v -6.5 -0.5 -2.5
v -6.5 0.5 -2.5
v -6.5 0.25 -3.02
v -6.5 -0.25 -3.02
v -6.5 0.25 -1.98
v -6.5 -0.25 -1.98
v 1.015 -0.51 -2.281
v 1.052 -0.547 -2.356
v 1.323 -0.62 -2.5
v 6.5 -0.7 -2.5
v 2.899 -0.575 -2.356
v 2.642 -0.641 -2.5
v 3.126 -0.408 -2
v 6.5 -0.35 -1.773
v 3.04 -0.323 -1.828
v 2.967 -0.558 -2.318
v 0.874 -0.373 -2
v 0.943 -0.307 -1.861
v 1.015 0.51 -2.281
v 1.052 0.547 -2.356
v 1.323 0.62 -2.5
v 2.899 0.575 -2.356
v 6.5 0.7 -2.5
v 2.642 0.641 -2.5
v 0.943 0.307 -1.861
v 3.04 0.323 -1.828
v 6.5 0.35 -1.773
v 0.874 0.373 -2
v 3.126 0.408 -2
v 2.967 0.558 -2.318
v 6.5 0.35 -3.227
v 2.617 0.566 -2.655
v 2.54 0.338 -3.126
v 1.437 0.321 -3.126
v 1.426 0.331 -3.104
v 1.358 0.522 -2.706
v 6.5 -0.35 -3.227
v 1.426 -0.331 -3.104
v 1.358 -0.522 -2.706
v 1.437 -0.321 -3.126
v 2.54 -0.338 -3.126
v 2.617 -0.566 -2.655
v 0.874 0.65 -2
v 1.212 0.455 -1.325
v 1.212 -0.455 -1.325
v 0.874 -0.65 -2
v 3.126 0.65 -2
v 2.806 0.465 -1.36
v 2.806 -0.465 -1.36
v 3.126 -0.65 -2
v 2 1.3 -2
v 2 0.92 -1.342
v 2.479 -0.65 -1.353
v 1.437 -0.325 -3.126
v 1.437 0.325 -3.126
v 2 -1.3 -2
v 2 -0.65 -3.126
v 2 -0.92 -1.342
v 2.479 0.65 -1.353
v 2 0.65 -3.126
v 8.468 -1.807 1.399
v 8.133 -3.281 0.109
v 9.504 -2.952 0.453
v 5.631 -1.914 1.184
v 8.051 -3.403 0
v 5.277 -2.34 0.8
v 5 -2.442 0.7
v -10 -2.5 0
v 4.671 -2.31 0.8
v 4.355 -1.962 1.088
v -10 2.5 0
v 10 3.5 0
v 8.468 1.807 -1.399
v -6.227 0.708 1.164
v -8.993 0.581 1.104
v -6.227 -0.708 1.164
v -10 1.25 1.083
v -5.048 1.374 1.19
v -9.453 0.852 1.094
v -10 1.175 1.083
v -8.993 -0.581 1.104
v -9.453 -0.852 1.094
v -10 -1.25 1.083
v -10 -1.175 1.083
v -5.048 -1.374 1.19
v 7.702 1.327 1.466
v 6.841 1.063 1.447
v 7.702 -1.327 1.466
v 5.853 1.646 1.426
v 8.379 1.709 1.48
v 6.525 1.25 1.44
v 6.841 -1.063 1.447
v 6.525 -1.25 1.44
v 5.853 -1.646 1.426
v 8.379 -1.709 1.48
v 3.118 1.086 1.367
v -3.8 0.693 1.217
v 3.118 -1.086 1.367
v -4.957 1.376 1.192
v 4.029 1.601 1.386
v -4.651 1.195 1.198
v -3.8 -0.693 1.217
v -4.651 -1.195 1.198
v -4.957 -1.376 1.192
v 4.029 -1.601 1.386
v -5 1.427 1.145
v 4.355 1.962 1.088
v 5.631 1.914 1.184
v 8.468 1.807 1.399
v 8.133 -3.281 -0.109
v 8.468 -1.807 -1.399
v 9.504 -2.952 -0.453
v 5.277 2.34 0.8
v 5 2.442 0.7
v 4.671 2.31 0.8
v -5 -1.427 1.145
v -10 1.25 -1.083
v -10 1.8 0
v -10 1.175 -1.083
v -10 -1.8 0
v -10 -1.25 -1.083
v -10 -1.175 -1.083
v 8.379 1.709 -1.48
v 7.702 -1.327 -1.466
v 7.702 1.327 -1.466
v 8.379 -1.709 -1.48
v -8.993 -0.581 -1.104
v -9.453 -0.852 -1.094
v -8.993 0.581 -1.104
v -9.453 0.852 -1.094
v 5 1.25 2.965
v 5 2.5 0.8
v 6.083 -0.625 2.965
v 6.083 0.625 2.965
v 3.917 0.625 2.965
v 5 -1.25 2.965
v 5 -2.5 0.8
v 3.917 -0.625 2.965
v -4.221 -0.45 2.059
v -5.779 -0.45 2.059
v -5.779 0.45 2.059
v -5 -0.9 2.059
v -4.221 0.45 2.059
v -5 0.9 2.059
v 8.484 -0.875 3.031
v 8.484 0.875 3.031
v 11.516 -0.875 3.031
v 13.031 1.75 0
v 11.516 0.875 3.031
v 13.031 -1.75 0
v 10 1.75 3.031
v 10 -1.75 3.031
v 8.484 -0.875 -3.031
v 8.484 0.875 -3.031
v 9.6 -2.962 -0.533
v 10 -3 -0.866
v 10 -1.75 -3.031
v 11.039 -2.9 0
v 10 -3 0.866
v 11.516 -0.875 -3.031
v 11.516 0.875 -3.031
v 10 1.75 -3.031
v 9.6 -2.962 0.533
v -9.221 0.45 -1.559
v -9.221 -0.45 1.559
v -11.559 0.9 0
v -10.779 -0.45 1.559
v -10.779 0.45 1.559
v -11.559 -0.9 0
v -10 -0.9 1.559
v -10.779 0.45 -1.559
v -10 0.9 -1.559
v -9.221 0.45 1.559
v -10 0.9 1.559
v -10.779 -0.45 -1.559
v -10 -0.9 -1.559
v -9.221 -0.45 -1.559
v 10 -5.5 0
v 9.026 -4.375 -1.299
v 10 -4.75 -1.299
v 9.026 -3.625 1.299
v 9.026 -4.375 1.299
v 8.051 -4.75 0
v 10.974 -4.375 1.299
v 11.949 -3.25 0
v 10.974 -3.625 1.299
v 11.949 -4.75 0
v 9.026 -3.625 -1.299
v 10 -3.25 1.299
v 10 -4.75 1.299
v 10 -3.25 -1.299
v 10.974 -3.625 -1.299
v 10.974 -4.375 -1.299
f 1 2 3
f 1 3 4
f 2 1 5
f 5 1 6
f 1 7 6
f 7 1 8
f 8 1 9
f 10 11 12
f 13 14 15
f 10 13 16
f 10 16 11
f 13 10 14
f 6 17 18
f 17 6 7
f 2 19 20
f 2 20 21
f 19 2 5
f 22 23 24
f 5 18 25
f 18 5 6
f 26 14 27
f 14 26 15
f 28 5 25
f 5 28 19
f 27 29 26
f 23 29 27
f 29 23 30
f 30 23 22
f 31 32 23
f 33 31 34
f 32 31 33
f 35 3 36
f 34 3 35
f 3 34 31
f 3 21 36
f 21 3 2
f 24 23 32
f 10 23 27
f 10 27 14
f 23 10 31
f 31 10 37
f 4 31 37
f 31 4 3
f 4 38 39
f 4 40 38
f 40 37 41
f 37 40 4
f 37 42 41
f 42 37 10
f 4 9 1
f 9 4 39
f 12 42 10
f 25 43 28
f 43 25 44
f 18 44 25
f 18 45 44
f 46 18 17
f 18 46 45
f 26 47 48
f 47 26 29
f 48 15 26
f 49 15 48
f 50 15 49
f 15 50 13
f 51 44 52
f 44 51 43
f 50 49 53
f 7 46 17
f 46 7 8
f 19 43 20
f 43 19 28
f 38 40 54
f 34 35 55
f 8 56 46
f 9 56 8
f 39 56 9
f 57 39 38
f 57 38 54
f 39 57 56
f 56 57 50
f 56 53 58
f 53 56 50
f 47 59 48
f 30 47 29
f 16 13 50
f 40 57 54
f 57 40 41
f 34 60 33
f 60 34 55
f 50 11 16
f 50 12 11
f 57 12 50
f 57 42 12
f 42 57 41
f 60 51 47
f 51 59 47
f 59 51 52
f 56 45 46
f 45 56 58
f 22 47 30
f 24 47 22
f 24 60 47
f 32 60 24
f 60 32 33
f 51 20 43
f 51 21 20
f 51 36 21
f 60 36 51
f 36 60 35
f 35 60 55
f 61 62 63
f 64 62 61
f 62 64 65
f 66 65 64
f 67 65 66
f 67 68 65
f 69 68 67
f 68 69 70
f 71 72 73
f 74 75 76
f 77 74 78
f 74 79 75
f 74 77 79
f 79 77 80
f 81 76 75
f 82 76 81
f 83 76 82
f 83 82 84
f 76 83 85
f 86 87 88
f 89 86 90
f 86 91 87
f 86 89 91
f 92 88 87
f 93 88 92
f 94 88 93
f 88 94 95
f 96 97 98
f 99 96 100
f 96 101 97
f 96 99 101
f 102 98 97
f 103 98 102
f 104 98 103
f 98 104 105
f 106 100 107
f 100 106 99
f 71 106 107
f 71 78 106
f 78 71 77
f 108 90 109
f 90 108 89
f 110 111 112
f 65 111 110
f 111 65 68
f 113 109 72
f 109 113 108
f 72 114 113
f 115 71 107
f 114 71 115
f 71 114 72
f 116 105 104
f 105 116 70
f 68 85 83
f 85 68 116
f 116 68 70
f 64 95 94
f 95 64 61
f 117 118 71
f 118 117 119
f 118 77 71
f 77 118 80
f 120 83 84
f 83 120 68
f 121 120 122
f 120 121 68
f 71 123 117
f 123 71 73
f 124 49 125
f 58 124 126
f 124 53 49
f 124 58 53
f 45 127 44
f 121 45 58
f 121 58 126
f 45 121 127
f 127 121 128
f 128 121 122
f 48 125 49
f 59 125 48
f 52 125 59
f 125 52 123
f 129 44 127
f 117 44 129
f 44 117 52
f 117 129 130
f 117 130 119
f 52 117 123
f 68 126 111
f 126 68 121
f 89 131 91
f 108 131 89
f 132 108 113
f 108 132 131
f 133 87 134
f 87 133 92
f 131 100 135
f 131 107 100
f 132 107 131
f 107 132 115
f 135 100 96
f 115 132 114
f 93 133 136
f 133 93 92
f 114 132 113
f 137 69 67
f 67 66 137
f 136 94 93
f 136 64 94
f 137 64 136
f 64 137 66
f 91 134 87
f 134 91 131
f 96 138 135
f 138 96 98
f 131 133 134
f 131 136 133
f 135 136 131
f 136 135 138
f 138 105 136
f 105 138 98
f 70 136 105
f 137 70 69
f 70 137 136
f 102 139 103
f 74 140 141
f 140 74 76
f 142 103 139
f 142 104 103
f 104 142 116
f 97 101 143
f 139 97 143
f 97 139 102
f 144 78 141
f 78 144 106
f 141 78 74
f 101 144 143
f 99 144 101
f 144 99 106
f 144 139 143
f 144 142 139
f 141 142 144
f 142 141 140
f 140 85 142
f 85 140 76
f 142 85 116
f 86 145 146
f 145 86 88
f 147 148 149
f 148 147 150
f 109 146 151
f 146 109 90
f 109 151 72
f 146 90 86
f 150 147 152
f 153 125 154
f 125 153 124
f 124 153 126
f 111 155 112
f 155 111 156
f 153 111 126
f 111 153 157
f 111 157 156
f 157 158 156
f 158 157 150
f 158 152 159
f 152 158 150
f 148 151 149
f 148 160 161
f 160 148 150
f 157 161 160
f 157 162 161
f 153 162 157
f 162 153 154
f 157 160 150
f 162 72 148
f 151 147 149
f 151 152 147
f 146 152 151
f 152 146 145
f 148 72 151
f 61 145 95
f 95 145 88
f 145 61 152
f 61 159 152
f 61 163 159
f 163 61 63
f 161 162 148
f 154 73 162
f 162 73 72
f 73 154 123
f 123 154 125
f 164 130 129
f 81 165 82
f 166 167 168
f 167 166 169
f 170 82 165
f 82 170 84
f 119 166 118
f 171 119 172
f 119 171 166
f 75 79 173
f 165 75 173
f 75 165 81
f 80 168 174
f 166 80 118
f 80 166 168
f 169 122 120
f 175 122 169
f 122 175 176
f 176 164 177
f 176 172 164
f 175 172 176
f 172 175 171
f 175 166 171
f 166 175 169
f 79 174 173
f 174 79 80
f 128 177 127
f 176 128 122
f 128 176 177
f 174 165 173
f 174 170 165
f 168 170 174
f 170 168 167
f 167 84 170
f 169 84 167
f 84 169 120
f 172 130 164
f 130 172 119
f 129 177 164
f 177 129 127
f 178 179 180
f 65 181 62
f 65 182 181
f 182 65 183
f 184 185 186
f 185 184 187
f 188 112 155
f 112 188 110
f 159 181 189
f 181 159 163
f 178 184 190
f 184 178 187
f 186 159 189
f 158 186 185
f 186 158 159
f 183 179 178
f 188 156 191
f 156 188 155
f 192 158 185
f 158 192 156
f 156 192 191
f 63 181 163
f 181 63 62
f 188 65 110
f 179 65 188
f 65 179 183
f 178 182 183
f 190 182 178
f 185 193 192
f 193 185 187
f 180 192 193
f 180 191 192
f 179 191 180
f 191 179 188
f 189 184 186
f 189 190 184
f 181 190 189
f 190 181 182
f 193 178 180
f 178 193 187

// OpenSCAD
module little_pod()
{
	scale(v = [1, 1.5, 1])
		sphere(r = 1.5, center = true);
}

module main_fuselage()
{
	union() {
		union() {
			rotate(a = 90, v = [1, 0, 0]) {
				scale(v = [1, 0.5, 1])
					cylinder(h = 20, r1 = 3.5, r2 = 2.5, center = true);
			}
			translate(v = [0, 5, 0.8])
				sphere(r = 2.5, center = true);
			translate(v = [0, -5, 0.5])
				sphere(r = 1.8, center = true);
		}
		translate(v = [0, 10, 0])
			sphere(r = 3.5, center = true);
		translate(v = [0, -10, 0])
			sphere(r = 1.8, center = true);
		translate(v = [4, 10, 0])
			little_pod();
	}
}

module sub_fuselage()
{
	union() {
		rotate(a = 90, v = [1, 0, 0]) {
			scale(v = [1, 1.2, 1])
				cylinder(h = 13, r1 = 0.7, r2 = 0.5, center = true);
		}
		translate(v = [0, 2, 0.5])
			sphere(r = 1.3, center = true);
	}
}

module ship()
{
	rotate(a = -90, v = [0, 0, 1])
	union() {
		translate(v = [0, 0, -2.5])
			sub_fuselage();
		main_fuselage();
	}
}

$fn = 6;
ship();
